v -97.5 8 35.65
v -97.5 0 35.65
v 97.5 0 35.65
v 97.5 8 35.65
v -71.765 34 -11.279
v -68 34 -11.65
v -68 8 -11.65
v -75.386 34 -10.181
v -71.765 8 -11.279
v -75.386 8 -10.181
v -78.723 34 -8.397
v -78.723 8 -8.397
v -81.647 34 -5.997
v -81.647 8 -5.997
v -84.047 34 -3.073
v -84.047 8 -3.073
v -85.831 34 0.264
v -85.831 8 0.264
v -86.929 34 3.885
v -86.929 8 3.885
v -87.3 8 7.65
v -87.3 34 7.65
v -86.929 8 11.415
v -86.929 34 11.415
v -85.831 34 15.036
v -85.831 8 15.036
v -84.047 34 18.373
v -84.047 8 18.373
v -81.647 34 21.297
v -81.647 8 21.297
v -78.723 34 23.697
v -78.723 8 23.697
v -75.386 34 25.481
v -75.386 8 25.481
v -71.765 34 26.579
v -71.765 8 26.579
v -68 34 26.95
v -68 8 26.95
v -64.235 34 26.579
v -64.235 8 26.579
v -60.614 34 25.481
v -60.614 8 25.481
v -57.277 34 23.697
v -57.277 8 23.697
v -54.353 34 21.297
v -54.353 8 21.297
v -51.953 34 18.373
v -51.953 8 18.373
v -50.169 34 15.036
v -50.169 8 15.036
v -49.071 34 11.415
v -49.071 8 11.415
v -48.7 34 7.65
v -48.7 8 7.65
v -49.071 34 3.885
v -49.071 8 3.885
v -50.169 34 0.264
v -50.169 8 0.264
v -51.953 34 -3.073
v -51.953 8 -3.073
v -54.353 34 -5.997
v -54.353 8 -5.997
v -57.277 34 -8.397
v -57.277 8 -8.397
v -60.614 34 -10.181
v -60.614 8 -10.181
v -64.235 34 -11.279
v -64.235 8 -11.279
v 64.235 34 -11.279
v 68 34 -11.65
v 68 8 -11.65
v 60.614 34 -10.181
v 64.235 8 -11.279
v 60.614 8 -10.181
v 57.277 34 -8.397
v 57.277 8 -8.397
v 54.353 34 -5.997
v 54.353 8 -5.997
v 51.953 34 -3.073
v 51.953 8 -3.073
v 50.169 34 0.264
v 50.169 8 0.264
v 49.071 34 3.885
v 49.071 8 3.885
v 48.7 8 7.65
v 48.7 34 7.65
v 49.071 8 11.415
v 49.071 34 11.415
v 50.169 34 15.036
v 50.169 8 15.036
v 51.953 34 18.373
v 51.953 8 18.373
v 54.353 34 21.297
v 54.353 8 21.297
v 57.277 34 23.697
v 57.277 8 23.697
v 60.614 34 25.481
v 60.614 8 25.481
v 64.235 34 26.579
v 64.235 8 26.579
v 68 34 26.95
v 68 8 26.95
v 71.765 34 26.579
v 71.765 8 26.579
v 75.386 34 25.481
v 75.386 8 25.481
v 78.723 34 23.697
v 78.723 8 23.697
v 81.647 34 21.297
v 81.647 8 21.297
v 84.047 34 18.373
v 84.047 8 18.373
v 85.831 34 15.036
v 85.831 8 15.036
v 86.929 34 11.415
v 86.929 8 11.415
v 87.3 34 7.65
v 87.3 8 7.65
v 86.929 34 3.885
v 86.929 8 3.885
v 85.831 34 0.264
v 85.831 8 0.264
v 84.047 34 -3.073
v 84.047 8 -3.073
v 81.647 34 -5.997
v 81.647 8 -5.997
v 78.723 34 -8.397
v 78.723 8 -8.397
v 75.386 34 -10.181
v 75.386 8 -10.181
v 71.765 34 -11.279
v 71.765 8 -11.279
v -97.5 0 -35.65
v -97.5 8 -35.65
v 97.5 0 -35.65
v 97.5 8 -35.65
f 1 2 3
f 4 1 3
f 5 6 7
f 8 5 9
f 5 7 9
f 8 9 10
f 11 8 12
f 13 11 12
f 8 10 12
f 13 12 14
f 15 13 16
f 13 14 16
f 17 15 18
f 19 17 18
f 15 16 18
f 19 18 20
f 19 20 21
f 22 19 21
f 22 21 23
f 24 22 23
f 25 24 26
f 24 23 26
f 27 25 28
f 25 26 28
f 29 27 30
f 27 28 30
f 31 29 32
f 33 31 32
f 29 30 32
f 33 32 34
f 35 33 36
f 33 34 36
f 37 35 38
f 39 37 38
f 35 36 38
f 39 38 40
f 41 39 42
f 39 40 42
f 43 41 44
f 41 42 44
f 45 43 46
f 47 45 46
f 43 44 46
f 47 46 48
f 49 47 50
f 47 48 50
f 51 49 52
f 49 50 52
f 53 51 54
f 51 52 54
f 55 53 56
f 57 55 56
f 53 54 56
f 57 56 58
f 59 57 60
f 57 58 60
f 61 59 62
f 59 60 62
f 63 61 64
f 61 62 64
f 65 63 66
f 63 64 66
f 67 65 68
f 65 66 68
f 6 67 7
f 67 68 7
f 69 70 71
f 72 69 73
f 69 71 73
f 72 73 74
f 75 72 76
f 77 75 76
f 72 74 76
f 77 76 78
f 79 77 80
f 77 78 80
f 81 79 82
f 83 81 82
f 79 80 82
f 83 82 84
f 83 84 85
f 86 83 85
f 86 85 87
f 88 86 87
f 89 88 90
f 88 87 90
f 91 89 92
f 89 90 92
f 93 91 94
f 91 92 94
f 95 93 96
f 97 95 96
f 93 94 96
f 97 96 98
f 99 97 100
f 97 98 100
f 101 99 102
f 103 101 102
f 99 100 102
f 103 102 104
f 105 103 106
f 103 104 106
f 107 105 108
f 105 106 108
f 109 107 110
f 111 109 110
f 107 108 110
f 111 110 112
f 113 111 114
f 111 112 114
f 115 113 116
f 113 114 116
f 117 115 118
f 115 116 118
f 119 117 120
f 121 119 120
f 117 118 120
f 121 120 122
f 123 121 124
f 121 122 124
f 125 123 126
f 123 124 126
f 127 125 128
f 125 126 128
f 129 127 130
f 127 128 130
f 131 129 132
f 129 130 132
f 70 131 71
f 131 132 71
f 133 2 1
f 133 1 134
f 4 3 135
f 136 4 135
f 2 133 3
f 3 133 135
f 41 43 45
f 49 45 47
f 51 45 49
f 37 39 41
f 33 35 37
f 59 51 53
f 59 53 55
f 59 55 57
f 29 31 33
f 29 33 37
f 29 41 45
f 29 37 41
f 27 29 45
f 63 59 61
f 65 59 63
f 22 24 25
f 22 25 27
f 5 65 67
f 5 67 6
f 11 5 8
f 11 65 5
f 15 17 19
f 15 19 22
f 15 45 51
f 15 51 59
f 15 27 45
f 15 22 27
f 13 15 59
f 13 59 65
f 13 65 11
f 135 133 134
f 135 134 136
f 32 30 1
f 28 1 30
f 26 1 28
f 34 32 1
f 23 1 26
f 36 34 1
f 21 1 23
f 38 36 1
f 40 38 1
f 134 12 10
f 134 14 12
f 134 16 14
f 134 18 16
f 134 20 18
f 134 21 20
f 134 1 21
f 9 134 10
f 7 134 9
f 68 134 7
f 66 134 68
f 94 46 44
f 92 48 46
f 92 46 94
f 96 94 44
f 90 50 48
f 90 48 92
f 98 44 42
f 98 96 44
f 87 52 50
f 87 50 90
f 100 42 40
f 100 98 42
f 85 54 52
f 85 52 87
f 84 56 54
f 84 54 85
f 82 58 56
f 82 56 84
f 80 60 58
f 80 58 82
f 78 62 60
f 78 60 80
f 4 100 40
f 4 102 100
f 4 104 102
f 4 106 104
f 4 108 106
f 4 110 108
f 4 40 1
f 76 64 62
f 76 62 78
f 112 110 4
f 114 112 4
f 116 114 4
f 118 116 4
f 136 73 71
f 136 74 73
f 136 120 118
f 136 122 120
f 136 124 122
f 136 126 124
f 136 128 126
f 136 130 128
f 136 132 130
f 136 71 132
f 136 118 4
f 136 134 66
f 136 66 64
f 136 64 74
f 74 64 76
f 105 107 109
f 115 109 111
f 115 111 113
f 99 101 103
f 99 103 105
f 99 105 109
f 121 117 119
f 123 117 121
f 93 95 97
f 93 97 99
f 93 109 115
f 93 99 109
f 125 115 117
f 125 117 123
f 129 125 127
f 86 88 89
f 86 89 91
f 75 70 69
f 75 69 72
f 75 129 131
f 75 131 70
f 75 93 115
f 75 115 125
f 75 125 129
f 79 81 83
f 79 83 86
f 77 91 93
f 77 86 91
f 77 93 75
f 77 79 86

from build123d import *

# Parameters (mm, degrees)
SKETCH_1_W      = 195
SKETCH_1_H      = 71.3
EXTRUDE_1_DEPTH = 8
SKETCH_2_R      = 19.3
EXTRUDE_2_DEPTH = 26


with BuildPart() as part:
    # 草图1 → 凸台-拉伸1 (new body)
    with BuildSketch(Plane(origin=(0, 0, 0), x_dir=(1, 0, 0), z_dir=(0, 1, 0))):
        Rectangle(SKETCH_1_W, SKETCH_1_H)
    extrude(amount=EXTRUDE_1_DEPTH)

    # 草图2 → 凸台-拉伸2 (add)
    with BuildSketch(Plane(origin=(0, 8, 0), x_dir=(1, 0, 0), z_dir=(0, 1, 0))):
        with Locations(Location((68, -7.65, 0), (0, 0, 90))):
            Circle(SKETCH_2_R)
        with Locations(Location((-68, -7.65, 0), (0, 0, 90))):
            Circle(SKETCH_2_R)
    extrude(amount=EXTRUDE_2_DEPTH)


solid = part.part
